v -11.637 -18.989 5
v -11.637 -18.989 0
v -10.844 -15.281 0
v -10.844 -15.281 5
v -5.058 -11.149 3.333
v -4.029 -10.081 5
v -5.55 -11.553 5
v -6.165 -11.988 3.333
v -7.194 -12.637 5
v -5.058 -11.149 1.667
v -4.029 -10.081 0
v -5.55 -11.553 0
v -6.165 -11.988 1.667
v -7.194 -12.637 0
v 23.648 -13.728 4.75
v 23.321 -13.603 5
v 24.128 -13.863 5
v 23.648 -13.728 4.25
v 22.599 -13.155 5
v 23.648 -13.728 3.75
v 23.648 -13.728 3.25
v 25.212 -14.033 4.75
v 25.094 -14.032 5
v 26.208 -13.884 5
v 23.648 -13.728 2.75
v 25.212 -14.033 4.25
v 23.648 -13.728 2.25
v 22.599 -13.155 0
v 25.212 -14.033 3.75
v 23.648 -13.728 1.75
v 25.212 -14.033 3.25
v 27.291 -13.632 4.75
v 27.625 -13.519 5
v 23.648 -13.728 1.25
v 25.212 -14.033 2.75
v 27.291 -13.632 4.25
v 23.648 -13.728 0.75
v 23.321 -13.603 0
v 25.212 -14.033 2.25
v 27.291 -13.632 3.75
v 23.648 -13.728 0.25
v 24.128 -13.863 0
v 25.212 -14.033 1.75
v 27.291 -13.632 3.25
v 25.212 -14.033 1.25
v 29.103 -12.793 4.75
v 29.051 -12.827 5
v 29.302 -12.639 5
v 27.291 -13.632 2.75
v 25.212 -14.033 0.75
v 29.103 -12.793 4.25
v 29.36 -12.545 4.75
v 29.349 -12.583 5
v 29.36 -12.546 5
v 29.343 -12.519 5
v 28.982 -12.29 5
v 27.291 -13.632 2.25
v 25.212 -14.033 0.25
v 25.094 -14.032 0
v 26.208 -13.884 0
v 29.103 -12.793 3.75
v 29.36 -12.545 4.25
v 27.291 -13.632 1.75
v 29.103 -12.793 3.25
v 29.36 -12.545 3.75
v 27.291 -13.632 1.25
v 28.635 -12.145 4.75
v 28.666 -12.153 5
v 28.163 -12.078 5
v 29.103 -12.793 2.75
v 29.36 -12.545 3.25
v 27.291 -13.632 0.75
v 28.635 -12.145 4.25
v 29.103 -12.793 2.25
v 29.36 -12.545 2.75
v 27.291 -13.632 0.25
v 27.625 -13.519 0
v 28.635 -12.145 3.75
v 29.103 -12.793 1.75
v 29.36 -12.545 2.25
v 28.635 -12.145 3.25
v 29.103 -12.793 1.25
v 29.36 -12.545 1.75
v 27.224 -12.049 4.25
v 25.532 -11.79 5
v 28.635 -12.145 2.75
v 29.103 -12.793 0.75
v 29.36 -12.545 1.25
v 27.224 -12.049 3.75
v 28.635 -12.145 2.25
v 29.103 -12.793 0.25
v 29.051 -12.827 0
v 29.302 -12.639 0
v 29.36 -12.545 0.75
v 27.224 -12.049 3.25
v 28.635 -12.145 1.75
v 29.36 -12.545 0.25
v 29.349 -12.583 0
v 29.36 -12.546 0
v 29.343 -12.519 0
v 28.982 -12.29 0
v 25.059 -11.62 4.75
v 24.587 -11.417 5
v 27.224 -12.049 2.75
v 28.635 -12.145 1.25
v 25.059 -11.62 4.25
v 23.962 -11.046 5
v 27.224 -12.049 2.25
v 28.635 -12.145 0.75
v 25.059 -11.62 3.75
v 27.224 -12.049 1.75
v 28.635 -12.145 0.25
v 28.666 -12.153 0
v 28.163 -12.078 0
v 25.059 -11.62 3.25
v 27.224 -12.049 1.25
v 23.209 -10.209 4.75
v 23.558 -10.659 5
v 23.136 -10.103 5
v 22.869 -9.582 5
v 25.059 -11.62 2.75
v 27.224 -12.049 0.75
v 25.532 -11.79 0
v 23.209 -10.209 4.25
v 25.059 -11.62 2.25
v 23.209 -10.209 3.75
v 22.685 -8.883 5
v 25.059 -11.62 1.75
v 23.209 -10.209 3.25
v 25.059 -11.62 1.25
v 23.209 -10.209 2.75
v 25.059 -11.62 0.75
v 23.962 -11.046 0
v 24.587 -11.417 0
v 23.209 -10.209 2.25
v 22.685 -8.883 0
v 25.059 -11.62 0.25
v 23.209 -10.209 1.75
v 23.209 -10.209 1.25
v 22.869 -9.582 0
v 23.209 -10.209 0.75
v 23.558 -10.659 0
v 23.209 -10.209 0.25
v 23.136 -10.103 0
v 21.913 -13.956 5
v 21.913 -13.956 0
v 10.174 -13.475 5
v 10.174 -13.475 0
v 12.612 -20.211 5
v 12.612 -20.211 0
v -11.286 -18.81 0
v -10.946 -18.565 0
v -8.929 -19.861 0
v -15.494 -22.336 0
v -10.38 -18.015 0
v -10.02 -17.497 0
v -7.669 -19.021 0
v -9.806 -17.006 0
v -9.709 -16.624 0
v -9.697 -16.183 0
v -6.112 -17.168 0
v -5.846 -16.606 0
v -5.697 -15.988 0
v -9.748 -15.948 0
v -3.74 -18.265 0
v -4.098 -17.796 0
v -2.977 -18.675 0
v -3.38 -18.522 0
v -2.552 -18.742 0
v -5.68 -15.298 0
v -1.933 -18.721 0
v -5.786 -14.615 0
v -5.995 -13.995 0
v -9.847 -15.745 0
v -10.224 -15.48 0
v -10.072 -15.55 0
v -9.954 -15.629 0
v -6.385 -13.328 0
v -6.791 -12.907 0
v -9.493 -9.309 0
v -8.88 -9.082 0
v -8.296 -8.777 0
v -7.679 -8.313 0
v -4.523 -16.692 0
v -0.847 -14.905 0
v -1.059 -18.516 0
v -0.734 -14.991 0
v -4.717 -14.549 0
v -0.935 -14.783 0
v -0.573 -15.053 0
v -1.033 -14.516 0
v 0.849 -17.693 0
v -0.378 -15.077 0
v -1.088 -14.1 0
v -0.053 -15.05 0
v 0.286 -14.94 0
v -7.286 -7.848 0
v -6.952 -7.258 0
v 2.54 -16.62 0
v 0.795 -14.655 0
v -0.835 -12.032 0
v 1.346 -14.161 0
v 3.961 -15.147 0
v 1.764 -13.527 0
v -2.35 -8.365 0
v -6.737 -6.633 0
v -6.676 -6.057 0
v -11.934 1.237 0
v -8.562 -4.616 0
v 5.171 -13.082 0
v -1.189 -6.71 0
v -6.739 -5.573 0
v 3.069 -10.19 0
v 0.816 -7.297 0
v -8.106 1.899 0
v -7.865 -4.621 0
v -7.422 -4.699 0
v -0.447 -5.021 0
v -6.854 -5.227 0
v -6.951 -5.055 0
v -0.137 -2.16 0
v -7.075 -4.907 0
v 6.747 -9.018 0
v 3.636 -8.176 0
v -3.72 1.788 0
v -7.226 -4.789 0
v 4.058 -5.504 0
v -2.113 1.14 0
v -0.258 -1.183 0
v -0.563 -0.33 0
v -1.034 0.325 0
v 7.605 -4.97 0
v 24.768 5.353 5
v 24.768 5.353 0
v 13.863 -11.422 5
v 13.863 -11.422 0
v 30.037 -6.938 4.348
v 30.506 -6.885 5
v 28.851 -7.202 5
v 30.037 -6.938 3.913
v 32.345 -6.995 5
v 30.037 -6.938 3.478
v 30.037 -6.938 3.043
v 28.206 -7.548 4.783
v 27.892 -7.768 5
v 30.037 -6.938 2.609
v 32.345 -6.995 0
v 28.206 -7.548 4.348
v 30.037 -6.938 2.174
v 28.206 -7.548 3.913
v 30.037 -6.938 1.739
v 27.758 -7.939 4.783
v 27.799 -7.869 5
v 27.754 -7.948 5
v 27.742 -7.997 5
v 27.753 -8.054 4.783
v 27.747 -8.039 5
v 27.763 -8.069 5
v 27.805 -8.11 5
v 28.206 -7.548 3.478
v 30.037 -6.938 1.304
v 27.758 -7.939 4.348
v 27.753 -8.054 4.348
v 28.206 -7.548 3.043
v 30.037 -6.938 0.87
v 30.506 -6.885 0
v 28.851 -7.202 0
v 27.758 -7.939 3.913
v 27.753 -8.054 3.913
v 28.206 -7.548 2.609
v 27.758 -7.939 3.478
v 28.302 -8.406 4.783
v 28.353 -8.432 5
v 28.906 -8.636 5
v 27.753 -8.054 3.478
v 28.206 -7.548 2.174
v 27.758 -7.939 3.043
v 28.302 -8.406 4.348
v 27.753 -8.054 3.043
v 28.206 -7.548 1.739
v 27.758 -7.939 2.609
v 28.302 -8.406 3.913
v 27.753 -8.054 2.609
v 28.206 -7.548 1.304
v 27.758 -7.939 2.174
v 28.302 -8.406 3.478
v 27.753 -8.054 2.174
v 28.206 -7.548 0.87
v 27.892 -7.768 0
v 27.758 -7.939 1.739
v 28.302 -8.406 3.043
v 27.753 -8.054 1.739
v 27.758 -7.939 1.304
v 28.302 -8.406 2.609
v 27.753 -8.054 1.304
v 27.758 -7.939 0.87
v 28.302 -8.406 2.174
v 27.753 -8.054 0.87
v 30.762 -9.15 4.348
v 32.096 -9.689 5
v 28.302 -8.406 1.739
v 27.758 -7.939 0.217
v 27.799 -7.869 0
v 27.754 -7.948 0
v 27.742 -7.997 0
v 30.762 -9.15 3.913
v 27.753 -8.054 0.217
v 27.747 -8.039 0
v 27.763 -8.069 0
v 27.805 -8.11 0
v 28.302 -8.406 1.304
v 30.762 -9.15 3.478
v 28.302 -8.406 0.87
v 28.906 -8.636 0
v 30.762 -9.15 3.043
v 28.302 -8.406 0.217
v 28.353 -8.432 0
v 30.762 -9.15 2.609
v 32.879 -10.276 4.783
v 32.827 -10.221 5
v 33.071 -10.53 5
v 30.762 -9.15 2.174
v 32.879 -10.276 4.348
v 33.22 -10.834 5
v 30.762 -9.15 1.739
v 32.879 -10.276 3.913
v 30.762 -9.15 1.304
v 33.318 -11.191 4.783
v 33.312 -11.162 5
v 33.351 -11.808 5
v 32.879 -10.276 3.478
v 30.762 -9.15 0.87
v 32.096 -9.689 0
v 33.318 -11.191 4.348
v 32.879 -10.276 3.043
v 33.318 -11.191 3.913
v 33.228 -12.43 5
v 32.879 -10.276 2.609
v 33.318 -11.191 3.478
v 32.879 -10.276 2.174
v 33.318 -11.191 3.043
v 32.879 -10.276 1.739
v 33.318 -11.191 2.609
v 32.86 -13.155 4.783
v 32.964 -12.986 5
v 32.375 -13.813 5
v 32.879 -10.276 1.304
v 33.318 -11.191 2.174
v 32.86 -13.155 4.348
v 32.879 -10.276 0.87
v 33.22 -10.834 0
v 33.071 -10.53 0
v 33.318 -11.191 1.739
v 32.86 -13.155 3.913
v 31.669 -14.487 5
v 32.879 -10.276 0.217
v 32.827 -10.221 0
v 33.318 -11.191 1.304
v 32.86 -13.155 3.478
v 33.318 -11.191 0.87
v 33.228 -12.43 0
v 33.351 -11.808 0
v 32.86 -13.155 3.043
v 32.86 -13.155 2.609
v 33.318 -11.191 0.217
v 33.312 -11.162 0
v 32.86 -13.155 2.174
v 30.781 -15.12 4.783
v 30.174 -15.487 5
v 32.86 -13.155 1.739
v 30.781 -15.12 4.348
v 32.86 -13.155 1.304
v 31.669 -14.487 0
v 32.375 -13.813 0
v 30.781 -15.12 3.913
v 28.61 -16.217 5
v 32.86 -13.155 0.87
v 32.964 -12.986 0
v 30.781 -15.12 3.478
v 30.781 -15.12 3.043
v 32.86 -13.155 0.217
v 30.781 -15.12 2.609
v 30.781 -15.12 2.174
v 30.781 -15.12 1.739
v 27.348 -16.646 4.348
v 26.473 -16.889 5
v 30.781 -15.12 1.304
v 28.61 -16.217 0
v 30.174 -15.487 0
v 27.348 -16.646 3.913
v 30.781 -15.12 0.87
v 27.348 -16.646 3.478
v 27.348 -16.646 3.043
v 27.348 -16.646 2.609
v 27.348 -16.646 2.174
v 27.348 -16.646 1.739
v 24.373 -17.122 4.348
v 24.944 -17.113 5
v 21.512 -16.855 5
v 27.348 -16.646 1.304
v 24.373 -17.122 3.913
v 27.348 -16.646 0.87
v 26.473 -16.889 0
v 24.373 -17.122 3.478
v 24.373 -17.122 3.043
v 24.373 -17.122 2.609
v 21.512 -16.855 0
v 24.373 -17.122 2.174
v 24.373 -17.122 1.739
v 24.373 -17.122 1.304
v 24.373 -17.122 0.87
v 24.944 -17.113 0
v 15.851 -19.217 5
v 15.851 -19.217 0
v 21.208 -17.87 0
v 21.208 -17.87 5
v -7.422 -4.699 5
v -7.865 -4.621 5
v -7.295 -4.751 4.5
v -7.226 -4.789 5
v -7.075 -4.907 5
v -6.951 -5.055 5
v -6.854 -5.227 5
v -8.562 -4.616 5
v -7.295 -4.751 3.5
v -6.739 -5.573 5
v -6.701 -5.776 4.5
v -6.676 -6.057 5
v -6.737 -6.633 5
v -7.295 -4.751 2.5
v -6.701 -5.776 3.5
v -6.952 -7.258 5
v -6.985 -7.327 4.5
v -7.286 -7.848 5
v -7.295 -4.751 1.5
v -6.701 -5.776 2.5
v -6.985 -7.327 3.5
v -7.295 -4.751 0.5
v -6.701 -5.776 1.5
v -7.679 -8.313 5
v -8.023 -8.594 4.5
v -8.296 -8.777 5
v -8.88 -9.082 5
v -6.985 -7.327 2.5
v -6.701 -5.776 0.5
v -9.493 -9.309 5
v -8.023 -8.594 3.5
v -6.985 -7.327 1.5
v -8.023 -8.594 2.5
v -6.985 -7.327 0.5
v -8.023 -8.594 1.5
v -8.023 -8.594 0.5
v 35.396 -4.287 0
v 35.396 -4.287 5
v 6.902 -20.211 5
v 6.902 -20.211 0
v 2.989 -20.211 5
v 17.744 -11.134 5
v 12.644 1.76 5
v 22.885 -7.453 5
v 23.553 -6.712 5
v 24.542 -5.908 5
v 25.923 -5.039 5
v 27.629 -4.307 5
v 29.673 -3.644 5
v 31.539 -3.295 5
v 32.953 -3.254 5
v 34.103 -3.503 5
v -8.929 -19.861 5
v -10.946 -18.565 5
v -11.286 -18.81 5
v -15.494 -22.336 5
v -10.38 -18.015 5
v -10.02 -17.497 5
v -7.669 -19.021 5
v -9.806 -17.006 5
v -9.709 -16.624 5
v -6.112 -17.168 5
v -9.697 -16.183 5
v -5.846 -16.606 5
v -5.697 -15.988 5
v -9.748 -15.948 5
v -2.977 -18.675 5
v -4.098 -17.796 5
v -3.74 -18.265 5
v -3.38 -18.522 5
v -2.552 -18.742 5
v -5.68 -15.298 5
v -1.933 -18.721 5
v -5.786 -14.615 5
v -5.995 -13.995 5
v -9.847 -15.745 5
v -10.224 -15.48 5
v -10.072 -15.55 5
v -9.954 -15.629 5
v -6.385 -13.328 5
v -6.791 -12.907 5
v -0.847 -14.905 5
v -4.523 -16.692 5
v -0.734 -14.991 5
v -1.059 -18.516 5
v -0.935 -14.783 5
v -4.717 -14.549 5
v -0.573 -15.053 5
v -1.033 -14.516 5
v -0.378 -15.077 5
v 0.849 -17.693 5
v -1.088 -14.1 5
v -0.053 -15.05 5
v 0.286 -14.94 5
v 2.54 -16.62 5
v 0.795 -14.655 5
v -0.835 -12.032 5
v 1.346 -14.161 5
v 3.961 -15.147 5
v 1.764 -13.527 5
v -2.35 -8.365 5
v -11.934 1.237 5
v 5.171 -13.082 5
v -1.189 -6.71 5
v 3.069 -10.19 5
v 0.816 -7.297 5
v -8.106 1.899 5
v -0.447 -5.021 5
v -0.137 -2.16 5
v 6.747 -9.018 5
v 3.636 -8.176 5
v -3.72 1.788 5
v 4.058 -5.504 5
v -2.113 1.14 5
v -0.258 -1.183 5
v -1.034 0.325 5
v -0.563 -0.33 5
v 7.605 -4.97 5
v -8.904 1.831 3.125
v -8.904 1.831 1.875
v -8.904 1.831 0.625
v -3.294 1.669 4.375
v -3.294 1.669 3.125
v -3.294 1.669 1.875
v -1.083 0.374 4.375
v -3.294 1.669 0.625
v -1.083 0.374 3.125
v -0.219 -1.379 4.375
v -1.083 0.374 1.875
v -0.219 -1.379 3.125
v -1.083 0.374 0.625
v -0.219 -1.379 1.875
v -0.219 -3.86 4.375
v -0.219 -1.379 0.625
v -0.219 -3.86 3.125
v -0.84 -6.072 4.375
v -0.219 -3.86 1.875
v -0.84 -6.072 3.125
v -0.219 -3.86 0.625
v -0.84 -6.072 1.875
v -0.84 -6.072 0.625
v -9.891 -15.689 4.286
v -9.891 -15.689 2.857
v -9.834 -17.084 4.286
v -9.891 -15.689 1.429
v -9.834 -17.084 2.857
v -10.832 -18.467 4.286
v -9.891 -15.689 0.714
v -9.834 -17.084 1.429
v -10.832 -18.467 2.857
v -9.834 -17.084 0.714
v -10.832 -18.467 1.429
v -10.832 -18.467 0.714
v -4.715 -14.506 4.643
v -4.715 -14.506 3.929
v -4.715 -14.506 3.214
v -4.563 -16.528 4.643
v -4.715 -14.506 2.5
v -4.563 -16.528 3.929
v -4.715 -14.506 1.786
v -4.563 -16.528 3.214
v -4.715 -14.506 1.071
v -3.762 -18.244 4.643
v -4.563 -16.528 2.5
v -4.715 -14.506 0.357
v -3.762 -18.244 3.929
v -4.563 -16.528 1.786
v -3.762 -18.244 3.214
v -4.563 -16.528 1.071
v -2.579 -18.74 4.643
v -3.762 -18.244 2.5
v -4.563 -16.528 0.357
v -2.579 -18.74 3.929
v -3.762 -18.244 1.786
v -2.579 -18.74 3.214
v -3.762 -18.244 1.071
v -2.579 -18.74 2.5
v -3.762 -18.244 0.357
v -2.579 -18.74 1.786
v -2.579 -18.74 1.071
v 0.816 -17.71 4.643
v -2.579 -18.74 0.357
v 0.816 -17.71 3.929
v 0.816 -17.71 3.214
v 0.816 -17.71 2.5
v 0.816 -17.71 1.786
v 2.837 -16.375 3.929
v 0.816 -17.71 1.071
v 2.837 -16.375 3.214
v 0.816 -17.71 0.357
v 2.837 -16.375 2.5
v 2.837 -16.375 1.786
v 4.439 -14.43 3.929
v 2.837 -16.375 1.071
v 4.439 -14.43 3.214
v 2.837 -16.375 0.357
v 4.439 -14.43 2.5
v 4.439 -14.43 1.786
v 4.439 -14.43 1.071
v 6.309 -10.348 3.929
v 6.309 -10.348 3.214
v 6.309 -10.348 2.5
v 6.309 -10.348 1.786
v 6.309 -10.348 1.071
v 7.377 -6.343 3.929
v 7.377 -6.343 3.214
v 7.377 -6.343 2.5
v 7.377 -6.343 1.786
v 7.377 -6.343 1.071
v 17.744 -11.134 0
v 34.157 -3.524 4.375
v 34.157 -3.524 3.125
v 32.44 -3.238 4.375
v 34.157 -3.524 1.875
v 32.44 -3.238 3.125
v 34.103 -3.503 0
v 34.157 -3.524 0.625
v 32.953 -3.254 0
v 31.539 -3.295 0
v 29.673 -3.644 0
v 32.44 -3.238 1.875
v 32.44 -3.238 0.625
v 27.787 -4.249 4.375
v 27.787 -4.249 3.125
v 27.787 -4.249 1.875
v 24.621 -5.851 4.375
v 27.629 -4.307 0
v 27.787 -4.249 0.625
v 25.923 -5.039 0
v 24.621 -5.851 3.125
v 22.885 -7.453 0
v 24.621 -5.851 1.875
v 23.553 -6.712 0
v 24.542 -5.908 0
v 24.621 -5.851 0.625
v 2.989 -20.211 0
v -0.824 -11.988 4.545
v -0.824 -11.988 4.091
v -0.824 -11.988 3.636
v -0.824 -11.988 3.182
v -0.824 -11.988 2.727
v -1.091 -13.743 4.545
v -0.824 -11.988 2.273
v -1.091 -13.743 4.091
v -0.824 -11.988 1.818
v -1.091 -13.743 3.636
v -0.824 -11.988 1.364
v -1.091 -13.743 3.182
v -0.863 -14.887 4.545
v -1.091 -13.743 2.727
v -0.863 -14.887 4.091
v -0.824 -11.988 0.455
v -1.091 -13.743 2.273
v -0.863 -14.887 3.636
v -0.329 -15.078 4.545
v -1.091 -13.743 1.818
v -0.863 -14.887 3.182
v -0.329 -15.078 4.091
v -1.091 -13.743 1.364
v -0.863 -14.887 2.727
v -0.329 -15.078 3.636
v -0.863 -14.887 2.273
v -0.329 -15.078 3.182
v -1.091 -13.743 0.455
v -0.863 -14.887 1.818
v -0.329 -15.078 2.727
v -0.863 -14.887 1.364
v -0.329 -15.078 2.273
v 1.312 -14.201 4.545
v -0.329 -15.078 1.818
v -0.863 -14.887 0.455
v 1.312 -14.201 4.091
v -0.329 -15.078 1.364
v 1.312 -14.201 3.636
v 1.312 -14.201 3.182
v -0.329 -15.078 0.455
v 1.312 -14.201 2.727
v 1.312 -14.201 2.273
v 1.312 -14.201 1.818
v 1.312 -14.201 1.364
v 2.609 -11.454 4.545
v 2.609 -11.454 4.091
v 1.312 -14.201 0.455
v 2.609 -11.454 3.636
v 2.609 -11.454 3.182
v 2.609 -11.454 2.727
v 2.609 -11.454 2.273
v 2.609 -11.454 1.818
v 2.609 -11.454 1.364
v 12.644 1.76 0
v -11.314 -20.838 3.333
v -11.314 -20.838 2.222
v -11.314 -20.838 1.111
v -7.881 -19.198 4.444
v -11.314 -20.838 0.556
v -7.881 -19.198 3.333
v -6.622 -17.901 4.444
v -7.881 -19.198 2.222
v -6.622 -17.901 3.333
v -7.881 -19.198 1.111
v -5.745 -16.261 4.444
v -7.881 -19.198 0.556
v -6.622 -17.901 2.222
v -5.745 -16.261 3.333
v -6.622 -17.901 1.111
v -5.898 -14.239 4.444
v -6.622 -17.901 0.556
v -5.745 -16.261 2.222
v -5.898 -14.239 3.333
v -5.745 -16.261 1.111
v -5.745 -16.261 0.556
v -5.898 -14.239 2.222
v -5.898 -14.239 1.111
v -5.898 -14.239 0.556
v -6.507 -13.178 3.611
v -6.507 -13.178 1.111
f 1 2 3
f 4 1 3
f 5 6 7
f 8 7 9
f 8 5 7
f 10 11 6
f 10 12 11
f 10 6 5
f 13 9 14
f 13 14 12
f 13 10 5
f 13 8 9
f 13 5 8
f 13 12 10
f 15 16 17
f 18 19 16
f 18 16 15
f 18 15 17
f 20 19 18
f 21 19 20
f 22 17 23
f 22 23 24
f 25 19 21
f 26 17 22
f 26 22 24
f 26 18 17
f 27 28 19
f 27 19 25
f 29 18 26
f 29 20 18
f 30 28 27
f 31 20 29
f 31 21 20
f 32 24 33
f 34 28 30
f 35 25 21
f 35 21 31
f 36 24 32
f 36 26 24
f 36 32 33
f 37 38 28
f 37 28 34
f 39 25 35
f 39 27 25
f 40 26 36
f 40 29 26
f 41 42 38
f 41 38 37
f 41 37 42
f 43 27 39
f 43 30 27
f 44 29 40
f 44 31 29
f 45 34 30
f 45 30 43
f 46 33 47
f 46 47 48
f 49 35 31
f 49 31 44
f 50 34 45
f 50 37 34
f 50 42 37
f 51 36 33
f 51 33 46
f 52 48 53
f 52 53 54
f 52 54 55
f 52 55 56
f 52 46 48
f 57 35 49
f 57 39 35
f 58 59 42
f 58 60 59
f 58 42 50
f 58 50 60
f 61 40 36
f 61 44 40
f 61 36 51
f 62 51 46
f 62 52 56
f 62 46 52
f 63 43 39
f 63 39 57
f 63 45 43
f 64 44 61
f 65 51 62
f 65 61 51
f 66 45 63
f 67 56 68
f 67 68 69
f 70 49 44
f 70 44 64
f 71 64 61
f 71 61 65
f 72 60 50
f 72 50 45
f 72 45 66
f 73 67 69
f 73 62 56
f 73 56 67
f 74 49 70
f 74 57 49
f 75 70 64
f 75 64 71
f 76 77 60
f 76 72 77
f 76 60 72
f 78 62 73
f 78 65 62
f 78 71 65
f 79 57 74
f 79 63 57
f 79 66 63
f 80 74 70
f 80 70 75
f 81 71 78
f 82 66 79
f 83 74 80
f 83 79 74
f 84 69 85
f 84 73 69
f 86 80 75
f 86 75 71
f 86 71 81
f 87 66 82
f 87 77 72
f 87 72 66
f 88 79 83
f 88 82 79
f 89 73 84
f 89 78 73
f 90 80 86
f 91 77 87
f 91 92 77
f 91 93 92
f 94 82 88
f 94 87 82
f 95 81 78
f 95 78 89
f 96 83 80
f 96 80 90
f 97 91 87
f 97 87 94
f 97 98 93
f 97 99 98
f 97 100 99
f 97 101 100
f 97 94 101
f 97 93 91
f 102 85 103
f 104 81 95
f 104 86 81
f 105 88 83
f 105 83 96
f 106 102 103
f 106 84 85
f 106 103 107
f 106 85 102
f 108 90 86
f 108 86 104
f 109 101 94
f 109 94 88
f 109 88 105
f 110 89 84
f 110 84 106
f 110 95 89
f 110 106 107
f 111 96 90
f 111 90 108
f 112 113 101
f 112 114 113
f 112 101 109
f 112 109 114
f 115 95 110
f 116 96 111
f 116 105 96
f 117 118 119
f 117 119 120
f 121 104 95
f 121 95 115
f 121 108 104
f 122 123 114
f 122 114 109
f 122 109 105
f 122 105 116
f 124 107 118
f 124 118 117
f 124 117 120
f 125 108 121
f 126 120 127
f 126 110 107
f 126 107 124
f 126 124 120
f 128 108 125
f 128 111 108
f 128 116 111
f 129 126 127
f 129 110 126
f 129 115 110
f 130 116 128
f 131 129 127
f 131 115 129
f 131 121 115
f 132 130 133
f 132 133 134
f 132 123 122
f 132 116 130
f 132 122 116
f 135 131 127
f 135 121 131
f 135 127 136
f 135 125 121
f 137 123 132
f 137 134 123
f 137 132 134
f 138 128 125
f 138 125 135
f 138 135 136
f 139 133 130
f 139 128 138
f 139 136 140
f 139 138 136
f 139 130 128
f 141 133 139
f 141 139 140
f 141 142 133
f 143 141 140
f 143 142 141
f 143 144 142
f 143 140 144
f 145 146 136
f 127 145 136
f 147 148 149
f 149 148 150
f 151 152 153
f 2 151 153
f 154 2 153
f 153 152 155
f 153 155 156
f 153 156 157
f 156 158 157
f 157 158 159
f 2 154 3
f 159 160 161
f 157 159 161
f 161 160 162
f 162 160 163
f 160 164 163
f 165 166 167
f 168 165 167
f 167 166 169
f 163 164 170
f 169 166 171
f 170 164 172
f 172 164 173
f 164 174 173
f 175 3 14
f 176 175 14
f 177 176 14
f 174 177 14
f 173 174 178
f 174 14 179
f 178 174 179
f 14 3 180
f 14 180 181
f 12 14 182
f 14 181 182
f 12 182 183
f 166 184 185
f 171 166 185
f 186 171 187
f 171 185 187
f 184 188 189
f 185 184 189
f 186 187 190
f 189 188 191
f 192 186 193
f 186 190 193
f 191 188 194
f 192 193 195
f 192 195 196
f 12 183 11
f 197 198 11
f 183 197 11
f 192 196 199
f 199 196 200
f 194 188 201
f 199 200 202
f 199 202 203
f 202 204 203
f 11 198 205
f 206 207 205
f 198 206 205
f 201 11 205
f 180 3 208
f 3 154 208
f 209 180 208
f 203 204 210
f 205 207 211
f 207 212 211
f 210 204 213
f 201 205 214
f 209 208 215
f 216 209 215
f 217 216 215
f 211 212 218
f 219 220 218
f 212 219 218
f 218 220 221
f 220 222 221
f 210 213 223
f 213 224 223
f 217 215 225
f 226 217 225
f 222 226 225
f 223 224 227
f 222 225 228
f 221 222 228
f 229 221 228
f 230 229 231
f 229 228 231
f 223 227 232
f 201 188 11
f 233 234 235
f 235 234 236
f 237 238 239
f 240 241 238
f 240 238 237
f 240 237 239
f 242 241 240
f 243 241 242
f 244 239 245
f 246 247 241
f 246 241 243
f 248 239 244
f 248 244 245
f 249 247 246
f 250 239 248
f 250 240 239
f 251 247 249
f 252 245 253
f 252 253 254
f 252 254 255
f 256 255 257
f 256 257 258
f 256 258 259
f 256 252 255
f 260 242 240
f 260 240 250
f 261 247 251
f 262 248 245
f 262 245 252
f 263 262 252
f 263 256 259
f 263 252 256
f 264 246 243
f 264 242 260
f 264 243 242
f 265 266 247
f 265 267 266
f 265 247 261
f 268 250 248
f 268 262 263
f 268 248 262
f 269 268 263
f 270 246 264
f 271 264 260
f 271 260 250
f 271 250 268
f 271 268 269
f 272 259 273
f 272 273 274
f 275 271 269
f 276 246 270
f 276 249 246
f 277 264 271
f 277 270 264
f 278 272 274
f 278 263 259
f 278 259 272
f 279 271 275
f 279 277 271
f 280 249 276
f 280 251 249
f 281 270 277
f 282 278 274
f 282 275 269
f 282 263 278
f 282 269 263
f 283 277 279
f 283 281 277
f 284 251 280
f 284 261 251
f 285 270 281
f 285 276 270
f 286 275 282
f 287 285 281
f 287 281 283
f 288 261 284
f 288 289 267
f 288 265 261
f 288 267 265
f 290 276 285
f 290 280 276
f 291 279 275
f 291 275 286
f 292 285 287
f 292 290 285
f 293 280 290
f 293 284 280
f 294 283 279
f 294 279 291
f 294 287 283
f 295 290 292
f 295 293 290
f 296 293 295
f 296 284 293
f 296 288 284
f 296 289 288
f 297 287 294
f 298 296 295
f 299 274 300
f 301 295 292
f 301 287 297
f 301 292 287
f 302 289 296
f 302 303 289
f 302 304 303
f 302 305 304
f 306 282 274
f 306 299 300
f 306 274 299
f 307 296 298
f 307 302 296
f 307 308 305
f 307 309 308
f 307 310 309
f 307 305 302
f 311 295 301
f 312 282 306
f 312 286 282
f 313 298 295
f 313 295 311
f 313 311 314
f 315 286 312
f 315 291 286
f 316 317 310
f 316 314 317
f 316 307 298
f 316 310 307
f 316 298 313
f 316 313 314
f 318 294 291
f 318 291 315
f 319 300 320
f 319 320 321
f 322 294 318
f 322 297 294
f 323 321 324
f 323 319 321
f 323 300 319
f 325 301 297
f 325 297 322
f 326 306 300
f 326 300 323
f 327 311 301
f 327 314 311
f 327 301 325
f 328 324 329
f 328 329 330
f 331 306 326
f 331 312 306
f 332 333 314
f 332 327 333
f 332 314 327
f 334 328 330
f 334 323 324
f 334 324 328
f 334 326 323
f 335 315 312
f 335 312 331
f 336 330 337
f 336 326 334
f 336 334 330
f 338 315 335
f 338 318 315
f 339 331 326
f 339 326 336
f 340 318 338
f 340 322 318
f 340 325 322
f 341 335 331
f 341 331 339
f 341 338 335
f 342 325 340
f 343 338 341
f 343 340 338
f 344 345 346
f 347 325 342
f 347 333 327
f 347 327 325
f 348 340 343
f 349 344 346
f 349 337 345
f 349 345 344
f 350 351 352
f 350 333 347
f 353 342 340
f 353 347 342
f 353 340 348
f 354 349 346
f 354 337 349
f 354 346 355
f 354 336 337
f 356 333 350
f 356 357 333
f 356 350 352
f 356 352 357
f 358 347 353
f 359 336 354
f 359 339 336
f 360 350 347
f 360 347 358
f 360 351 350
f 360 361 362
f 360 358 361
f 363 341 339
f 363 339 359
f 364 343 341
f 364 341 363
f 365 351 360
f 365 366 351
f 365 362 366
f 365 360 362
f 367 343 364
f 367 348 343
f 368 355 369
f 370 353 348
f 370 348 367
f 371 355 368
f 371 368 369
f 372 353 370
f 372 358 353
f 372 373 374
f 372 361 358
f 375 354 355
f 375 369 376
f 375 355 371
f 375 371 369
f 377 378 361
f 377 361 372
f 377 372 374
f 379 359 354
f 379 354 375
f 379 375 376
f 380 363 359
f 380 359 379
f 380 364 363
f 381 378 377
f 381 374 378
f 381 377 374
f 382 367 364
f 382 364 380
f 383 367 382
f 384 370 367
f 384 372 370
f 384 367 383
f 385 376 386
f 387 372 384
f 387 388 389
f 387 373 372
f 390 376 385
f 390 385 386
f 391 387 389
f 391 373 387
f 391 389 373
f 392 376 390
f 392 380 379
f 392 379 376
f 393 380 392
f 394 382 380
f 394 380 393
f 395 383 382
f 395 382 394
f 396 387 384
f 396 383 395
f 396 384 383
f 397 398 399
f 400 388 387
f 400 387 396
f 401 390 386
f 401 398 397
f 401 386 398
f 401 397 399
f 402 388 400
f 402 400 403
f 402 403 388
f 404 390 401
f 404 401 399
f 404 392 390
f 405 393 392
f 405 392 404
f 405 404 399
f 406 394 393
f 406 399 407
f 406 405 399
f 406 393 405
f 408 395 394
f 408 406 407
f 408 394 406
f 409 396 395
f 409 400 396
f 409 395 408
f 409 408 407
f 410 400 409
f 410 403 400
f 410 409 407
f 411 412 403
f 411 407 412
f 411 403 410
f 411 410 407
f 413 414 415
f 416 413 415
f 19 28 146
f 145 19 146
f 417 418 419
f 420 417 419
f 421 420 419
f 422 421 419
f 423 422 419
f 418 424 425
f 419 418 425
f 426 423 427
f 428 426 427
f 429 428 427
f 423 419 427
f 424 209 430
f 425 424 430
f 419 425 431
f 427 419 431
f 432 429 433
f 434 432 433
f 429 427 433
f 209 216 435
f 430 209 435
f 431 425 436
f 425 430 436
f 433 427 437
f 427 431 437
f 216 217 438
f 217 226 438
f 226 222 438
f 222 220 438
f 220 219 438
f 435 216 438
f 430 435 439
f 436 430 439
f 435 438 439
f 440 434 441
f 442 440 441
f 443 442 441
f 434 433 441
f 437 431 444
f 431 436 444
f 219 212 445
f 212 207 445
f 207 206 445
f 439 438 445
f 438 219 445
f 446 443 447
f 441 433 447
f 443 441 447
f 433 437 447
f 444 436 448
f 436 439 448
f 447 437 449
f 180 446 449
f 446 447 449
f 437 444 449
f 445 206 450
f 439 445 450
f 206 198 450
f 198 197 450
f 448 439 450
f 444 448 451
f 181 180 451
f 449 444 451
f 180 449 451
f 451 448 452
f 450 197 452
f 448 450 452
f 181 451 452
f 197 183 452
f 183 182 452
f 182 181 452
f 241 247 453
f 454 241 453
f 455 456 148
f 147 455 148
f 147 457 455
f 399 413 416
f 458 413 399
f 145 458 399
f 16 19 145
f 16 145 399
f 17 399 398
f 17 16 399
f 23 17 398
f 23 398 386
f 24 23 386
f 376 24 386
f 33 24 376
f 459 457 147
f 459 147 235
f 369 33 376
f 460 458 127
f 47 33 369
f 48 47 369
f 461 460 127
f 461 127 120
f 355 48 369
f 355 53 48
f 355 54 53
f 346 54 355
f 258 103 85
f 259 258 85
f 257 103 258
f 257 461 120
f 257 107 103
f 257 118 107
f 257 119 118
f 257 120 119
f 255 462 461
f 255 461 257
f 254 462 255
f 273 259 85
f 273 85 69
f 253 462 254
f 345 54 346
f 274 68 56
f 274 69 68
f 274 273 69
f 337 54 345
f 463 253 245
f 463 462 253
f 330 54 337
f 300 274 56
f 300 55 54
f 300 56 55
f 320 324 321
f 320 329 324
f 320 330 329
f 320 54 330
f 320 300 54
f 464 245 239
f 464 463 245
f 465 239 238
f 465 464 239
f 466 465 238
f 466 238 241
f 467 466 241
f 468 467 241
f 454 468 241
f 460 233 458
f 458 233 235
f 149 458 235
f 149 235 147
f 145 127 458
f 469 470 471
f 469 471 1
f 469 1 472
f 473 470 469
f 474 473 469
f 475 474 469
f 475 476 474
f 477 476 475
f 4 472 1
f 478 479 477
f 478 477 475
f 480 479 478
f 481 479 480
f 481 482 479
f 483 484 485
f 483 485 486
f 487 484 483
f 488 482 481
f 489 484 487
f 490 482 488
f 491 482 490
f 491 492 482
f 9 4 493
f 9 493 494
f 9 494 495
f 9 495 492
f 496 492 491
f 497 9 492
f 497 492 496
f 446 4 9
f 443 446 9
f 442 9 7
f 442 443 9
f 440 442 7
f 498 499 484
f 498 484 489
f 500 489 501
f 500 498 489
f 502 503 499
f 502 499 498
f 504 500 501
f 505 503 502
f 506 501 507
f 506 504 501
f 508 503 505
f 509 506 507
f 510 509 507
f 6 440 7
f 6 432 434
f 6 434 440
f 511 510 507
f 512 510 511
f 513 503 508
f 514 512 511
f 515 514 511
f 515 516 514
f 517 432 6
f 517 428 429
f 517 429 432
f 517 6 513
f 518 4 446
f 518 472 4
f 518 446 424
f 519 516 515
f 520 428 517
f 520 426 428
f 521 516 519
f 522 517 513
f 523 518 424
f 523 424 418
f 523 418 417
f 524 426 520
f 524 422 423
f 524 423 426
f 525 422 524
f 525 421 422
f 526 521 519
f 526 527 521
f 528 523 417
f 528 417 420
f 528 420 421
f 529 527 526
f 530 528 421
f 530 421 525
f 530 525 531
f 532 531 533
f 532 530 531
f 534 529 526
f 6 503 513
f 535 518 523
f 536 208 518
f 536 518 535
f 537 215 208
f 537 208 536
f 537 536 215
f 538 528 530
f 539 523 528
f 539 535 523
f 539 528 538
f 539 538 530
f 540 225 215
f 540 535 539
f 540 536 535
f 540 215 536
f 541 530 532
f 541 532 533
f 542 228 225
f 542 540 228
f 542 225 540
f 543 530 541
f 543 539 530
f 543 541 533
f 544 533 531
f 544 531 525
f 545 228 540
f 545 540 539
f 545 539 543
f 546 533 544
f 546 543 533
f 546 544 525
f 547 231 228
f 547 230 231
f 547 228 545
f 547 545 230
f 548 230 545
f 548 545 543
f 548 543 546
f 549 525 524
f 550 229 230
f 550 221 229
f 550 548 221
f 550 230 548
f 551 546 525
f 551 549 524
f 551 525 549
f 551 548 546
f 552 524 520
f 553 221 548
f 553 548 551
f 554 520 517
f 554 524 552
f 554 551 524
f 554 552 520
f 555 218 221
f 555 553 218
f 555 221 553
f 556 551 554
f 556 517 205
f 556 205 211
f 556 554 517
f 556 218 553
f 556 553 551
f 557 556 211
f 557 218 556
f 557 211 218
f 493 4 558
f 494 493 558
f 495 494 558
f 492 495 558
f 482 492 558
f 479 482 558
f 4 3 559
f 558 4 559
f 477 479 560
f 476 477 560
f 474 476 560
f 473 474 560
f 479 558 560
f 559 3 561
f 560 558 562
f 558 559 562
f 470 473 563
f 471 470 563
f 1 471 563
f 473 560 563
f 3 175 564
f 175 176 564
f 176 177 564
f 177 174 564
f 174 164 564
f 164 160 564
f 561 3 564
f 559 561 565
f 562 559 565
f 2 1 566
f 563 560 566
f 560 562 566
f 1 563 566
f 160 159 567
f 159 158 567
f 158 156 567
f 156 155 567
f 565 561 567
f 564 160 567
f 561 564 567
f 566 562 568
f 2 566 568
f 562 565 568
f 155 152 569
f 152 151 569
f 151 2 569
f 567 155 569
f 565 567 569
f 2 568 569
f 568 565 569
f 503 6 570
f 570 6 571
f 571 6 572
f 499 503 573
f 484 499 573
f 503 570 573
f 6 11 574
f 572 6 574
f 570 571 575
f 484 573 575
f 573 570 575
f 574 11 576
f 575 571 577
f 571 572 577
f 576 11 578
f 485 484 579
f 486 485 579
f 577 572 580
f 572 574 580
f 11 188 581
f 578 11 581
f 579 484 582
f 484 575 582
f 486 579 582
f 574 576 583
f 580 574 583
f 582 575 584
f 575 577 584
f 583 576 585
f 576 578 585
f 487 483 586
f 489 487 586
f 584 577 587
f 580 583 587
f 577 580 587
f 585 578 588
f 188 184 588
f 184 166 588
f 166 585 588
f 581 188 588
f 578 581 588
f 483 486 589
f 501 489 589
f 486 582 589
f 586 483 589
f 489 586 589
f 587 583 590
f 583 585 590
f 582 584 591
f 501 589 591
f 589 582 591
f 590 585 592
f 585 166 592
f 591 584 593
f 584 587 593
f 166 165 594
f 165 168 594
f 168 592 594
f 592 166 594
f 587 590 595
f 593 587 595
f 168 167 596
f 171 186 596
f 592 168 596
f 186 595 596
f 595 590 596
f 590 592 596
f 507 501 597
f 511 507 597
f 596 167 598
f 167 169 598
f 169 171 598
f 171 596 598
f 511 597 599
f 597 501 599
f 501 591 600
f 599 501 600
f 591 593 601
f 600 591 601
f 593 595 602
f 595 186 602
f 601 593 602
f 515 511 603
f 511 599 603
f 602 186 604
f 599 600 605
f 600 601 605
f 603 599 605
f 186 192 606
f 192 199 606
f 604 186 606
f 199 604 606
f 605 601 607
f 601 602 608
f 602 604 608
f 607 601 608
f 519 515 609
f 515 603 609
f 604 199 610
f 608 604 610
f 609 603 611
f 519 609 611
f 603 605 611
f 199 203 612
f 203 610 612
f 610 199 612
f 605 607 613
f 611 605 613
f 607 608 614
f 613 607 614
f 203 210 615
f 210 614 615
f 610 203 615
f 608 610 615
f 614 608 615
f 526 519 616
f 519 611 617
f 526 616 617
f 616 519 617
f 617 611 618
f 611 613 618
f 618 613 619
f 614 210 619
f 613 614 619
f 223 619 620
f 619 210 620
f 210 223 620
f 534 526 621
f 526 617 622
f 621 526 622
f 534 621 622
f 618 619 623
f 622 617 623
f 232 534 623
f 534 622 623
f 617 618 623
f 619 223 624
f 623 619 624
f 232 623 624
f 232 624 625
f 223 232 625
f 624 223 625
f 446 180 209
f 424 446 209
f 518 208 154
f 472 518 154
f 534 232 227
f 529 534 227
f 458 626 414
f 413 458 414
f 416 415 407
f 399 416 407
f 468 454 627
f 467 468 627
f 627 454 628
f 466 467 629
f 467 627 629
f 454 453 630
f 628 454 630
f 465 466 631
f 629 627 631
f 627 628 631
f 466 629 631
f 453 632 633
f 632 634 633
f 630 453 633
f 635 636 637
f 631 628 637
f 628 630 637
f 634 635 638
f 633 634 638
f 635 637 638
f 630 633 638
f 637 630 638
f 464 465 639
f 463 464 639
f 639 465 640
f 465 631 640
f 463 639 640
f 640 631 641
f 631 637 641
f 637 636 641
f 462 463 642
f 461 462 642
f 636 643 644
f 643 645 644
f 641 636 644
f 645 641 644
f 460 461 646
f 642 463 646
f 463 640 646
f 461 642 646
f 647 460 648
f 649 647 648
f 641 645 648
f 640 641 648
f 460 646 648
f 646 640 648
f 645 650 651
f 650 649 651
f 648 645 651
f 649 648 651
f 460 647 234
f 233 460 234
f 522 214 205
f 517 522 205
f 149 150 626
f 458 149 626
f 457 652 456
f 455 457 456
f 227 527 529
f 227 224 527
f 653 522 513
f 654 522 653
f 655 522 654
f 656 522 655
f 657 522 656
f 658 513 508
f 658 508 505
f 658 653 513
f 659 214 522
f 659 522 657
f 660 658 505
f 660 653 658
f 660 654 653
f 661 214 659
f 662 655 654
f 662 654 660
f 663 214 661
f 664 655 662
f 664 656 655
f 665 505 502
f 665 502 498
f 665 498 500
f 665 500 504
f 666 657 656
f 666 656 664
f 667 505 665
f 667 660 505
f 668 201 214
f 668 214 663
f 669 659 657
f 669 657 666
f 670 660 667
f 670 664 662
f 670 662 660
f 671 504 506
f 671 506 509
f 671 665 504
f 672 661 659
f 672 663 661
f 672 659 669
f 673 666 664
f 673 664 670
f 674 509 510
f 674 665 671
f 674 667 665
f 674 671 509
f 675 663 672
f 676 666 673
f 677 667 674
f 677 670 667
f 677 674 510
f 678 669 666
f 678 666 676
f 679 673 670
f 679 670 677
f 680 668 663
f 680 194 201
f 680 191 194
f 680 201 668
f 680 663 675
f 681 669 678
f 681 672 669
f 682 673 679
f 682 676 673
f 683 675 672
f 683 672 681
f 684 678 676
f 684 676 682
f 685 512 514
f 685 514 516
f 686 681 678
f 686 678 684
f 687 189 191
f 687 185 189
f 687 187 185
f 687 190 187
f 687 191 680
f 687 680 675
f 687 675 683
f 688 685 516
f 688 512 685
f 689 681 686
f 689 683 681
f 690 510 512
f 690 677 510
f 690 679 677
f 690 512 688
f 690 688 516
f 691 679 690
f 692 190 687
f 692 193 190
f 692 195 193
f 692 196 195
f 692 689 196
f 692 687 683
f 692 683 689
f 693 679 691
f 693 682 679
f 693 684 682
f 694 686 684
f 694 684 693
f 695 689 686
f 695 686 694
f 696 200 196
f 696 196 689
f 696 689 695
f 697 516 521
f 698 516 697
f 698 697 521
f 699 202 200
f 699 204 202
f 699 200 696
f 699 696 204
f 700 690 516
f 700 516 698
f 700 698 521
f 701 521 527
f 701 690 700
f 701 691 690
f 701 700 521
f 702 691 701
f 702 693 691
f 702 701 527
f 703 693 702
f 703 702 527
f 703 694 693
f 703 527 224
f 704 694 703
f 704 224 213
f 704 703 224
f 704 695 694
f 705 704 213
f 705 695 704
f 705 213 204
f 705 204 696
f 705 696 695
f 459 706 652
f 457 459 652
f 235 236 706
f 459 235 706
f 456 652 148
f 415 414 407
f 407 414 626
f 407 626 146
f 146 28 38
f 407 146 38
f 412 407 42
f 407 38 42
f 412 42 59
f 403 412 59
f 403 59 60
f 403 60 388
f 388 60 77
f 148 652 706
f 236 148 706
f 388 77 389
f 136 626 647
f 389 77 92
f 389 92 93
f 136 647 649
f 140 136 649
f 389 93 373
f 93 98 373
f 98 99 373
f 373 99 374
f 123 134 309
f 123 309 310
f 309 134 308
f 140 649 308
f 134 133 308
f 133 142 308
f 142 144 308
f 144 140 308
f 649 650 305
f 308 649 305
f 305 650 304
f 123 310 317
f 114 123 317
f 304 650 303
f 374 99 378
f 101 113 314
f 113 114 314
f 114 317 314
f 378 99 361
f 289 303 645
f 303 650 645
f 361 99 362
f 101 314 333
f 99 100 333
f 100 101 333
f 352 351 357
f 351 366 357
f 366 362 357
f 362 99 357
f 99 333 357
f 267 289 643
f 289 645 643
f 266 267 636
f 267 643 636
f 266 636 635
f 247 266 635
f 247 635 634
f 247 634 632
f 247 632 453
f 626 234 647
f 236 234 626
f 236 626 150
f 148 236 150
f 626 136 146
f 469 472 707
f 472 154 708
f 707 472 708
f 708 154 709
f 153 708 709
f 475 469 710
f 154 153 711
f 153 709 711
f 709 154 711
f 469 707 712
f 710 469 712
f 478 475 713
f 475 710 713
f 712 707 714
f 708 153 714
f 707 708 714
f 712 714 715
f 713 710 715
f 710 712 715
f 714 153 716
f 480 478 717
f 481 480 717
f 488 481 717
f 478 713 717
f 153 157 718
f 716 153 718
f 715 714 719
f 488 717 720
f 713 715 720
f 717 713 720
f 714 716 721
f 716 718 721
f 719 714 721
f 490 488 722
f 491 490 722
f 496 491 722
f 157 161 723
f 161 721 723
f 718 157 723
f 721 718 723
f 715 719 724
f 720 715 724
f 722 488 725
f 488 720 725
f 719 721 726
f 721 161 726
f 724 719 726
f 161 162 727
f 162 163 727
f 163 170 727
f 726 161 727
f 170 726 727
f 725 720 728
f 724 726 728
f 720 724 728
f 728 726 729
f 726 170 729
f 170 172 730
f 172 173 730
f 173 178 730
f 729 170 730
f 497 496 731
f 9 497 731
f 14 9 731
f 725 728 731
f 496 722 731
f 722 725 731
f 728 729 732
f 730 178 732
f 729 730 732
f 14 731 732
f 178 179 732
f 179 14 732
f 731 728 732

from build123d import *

# Parameters (mm, degrees)
F1_DEPTH = 5


with BuildPart() as f1:
    # F0 (on Top) → F1 (new body)
    with BuildSketch(Plane.XY):
        with BuildLine():
            Line((-11.9339115918, 1.2369948672), (-15.4942041263, -22.3364569247))
            add(Edge.make_bspline(
                [(-15.4942041263, -22.3364569247), (-14.9275565475, -22.140823668), (-13.7003593821, -21.717137788), (-11.3227416299, -20.841670387), (-9.2973726702, -20.0925704973), (-7.831790759, -19.270240376), (-6.576636471, -17.9263205711), (-5.5215748727, -16.3353539415), (-5.7458541424, -14.2266496026), (-6.5496151072, -13.02801702), (-7.0047088618, -12.7519690511), (-7.1944813244, -12.6368580386)],
                knots=[0, 0, 0, 0, 0.1154978319, 0.2501353878, 0.3742669287, 0.4821317926, 0.5952976777, 0.7101035609, 0.829961235, 0.9290944451, 1, 1, 1, 1], degree=3))
            add(Edge.make_bspline(
                [(-4.0285252035, -10.0812064484), (-4.3613983661, -10.451821146), (-5.0162840913, -11.1809585543), (-6.1494060095, -11.9981207157), (-6.8538565223, -12.428672302), (-7.1944813244, -12.6368580386)],
                knots=[0, 0, 0, 0, 0.3480612414, 0.684766344, 1, 1, 1, 1], degree=3))
            add(Edge.make_bspline(
                [(-4.0285252035, -10.0812064484), (-4.1765626816, -10.7494306121), (-4.4821186932, -12.1286753339), (-4.7788494338, -14.5106317337), (-4.6824192494, -16.4803958858), (-3.9497327675, -18.4029742085), (-2.5600138272, -18.8488591096), (-1.1094105527, -18.6066651591), (0.870074742, -17.7465124687), (2.9532099101, -16.45219886), (4.5102446816, -14.5416170976), (5.8073007182, -11.7614166469), (6.3021321717, -10.384367405), (7.0063793042, -8.2893500091), (7.3801050806, -6.3764877409), (7.534904087, -5.4100629487), (7.605407387, -4.9699041992)],
                knots=[0, 0, 0, 0, 0.0734242477, 0.1515509489, 0.2236588551, 0.2933578572, 0.3507031706, 0.4111389259, 0.4854593255, 0.5642840114, 0.6446781352, 0.7321774873, 0.794387016, 0.8688062823, 0.9402477428, 1, 1, 1, 1], degree=3))
            Line((7.605407387, -4.9699041992), (4.0580104105, -5.5039203726))
            add(Edge.make_bspline(
                [(0.8157671546, -7.2966907173), (0.392177426, -8.3983824468), (-0.3385584106, -10.2989139594), (-0.8446044507, -11.9351028085), (-1.1675495345, -13.6592939514), (-1.0206611002, -14.9839379688), (-0.3029098706, -15.1206715644), (0.359193733, -14.9673898334), (1.430903313, -14.2582811685), (2.0756398847, -12.912807819), (2.6176783013, -11.4113319326), (3.6249545524, -8.7763418161), (3.9090742741, -6.6293682733), (4.0580104105, -5.5039203726)],
                knots=[0, 0, 0, 0, 0.1273774207, 0.2197391481, 0.3137387774, 0.3899608444, 0.4430933127, 0.500681924, 0.5788818693, 0.6639180353, 0.7529964993, 0.8705202623, 1, 1, 1, 1], degree=3))
            Line((0.8157671546, -7.2966907173), (-2.3501878604, -8.3647249267))
            add(Edge.make_bspline(
                [(-11.9339115918, 1.2369948672), (-10.9796138257, 1.4722094614), (-8.9848616492, 1.9638744746), (-5.2238298859, 1.9671752862), (-3.3311900704, 1.8416948837), (-0.8687690858, 0.5309553073), (-0.0604239132, -1.3473730095), (-0.138866357, -3.9040861608), (-0.6919741352, -6.1491604791), (-1.7812739747, -7.6045904761), (-2.3501878604, -8.3647249267)],
                knots=[0, 0, 0, 0, 0.1370597913, 0.2864937201, 0.3957198708, 0.5205972396, 0.629642061, 0.752521664, 0.8707482948, 1, 1, 1, 1], degree=3))
        make_face()
        with BuildLine():
            add(Edge.make_bspline(
                [(-10.8436187729, -15.2807272971), (-10.70332069, -15.3150570995), (-10.4022551094, -15.4172808235), (-9.8028030152, -15.6153138212), (-9.6264916345, -16.3682936676), (-9.8095664104, -17.0982242739), (-10.1738248562, -17.8275903701), (-10.8303737441, -18.4979285041), (-11.3085703924, -18.8529193401), (-11.63743902, -18.9890023321)],
                knots=[0, 0, 0, 0, 0.1139139383, 0.2412668472, 0.3802367572, 0.5254274053, 0.6758171135, 0.8359764645, 1, 1, 1, 1], degree=3))
            Line((-11.63743902, -18.9890023321), (-10.8436187729, -15.2807272971))
        make_face(mode=Mode.SUBTRACT)
        with BuildLine():
            add(Edge.make_bspline(
                [(-8.5624214262, -4.6159103513), (-8.3662386348, -4.6105898342), (-7.961419712, -4.5997464121), (-7.2624195509, -4.682447499), (-6.842980735, -5.1342312972), (-6.6744954788, -5.7835784605), (-6.6585979694, -6.4653552795), (-6.9464888518, -7.3454475041), (-7.4658883383, -8.1463059856), (-8.0079994552, -8.6069878323), (-8.7173544583, -9.0431923538), (-9.2340425255, -9.2198639021), (-9.4929523766, -9.3090236187)],
                knots=[0, 0, 0, 0, 0.0909252953, 0.1867785052, 0.2750654367, 0.3690540556, 0.4648977176, 0.576922585, 0.6904706787, 0.788589815, 0.8940519656, 1, 1, 1, 1], degree=3))
            Line((-9.4929523766, -9.3090236187), (-8.5624214262, -4.6159103513))
        make_face(mode=Mode.SUBTRACT)
    extrude(amount=F1_DEPTH)


with BuildPart() as f1b:
    # F0 (on Top) → F1, piece 2 (new body)
    with BuildSketch(Plane.XY):
        with BuildLine():
            Line((32.3449000716, -6.9951475598), (35.3964231908, -4.2869201861))
            add(Edge.make_bspline(
                [(35.3964231908, -4.2869201861), (35.0033863439, -3.9993946344), (34.1806095403, -3.3974934228), (32.4056094483, -3.1283439329), (29.8875753894, -3.5168305226), (27.820135685, -4.217397492), (25.9579543114, -4.9563967637), (24.6394839883, -5.8054290916), (23.4611808588, -6.7415388796), (23.0604026245, -7.2364796213), (22.8851754218, -7.4528763071)],
                knots=[0, 0, 0, 0, 0.1155674022, 0.2419268791, 0.394612825, 0.5379098603, 0.6722153485, 0.7931160282, 0.9095467355, 1, 1, 1, 1], degree=3))
            Line((22.8851754218, -7.4528763071), (24.7680991888, 5.352914799))
            Line((24.7680991888, 5.352914799), (13.8625325635, -11.422409676))
            Line((13.8625325635, -11.422409676), (12.6436753199, 1.7604936147))
            Line((12.6436753199, 1.7604936147), (2.9890427832, -20.211013034))
            Line((2.9890427832, -20.211013034), (6.9022160023, -20.211013034))
            Line((6.9022160023, -20.211013034), (10.1738860831, -13.4752225131))
            Line((10.1738860831, -13.4752225131), (12.6116005704, -20.211013034))
            Line((12.6116005704, -20.211013034), (17.7436303347, -11.1337332055))
            Line((17.7436303347, -11.1337332055), (15.851194039, -19.2166808993))
            Line((15.851194039, -19.2166808993), (21.2077517062, -17.8695227951))
            Line((21.2077517062, -17.8695227951), (21.5119887143, -16.8553832918))
            add(Edge.make_bspline(
                [(32.3449000716, -6.9951475598), (31.9716217807, -6.9348196191), (31.2166316227, -6.8128007323), (30.0489131862, -6.9213092877), (28.8948852837, -7.1153781332), (28.2254914254, -7.537765255), (27.8446839361, -7.7712617595), (27.6654041714, -8.0752646901), (28.0346173437, -8.2130252202), (28.3002071528, -8.452594206), (29.3371315449, -8.7764080738), (30.7742729499, -9.1323747826), (31.8210267688, -9.5004445437), (32.9689948015, -10.1955633605), (33.3946262492, -11.1680118439), (33.3533029309, -12.2887370753), (32.874376806, -13.1832424561), (32.1309926666, -14.1764803224), (30.77415279, -15.1662248161), (29.2593431396, -16.0082243911), (27.3738339133, -16.6637481999), (25.7067645715, -17.1009142258), (24.3842616001, -17.1318026064), (22.8386320744, -17.1058314132), (21.9451192038, -16.9371510982), (21.5119887143, -16.8553832918)],
                knots=[0, 0, 0, 0, 0.0445115188, 0.0900286982, 0.1352752191, 0.1721185894, 0.2001724321, 0.2209933626, 0.2439555842, 0.2690392275, 0.3118760791, 0.3634658497, 0.4081247488, 0.4553399115, 0.4974698032, 0.5406973925, 0.5822968719, 0.6285056548, 0.6823701708, 0.7378129447, 0.7970822704, 0.851712974, 0.8997214023, 0.9513899357, 1, 1, 1, 1], degree=3))
        make_face()
        with BuildLine():
            add(Edge.make_bspline(
                [(22.599093616, -13.1554109976), (22.786306473, -13.2872559939), (23.1424557952, -13.5380748043), (23.6474098879, -13.7411471993), (24.3712422437, -13.9293996), (25.2172606403, -14.1039318707), (26.3303276172, -13.8523789715), (27.2917456379, -13.6689630781), (28.2976032868, -13.2507802397), (29.0484744516, -12.8555420692), (29.4436596086, -12.5362954578), (29.2171852605, -12.4748962395), (28.9830996585, -12.2654588015), (28.6281708823, -12.1257540648), (28.1372806632, -12.0590967434), (27.2142916764, -12.0792540901), (25.8073858304, -11.9018761134), (25.0718186376, -11.6335171089), (23.8892291143, -11.1342300075), (23.208354649, -10.2190386654), (22.8790233204, -9.7240946414), (22.7535247119, -9.1804633686), (22.6849187165, -8.8832778856)],
                knots=[0, 0, 0, 0, 0.0474395014, 0.0902477883, 0.1401269433, 0.1944123753, 0.2561373298, 0.3144548744, 0.3752871886, 0.4310397774, 0.4659190607, 0.4875544953, 0.5206943019, 0.5562721954, 0.5963533595, 0.6530511105, 0.7221782392, 0.7747240641, 0.8399447444, 0.9015269831, 0.946168014, 1, 1, 1, 1], degree=3))
            Line((22.599093616, -13.1554109976), (21.9134055078, -13.9563502744))
            Line((21.9134055078, -13.9563502744), (22.6849187165, -8.8832778856))
        make_face(mode=Mode.SUBTRACT)
    extrude(amount=F1_DEPTH)


solid = Compound([f1.part, f1b.part])
